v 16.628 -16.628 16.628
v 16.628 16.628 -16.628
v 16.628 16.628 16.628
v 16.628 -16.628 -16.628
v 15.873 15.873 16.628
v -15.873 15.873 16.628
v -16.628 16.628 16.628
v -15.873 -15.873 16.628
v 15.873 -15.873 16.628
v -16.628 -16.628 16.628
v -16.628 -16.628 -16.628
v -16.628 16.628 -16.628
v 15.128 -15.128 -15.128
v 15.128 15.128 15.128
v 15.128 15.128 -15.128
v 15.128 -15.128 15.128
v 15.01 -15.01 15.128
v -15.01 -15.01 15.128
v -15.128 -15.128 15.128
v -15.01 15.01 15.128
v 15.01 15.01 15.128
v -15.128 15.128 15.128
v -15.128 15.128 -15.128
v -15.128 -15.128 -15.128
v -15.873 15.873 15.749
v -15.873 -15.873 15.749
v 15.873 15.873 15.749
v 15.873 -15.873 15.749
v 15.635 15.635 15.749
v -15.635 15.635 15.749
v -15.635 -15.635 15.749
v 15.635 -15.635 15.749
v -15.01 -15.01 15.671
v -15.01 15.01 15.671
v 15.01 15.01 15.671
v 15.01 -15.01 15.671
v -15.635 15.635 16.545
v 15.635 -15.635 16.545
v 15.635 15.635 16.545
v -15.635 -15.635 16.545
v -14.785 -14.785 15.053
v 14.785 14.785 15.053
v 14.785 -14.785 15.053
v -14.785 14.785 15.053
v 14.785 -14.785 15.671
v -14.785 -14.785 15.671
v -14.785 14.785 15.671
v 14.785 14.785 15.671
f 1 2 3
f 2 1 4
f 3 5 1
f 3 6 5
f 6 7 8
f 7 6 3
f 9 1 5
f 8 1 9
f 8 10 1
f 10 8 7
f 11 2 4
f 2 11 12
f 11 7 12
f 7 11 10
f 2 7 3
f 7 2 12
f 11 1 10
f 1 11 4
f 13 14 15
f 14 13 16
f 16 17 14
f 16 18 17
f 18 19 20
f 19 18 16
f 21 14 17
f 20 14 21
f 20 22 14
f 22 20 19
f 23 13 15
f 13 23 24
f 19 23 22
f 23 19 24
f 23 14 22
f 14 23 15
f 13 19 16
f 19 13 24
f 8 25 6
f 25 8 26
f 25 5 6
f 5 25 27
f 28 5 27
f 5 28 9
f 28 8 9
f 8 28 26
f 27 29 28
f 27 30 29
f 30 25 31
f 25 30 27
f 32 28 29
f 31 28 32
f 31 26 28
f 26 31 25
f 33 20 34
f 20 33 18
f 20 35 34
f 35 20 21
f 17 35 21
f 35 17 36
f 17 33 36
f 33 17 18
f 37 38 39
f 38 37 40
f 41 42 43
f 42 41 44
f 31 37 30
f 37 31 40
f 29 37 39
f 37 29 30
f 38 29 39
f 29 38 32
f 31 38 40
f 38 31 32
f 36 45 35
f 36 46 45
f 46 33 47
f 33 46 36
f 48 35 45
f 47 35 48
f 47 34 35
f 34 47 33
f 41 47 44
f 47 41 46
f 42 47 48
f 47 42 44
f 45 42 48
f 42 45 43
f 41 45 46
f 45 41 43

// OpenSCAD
arete = 33.257;
paroi = 1.5;
echelleReductionAjustementBouchon = 0.985;
r = 0.19; // résolution d'impression sur l'axe Z

//ico_creux();
//decoupe_bouchon();
corps_ouvert();
bouchon();
//trou();

module corps_ouvert() {
    //rotate([180, 0, 0])
	difference() {
		cube_creux();
		decoupe_bouchon();
	}
}

module bouchon() {
	scale([echelleReductionAjustementBouchon, echelleReductionAjustementBouchon, 0.995])
	difference () {
        intersection() {
            cube_creux();
            decoupe_bouchon(echelleReductionAjustementBouchon);
        }
	}
}

module cube_creux() {
	difference() {
        cube(arete, center=true);
        cube(arete-2*paroi, center=true);
	}
}

module decoupe_bouchon(scale=1) {
	rotate([0,0,45]) translate([0,0,arete/2*0.89+5*r])
		cylinder(6*r, r=arete*0.675, $fn=4);
	rotate([0,0,45]) translate([0,0,arete/2*0.89])
		cylinder(6*r, r=(arete-paroi/2)*0.653, $fn=4);
}
